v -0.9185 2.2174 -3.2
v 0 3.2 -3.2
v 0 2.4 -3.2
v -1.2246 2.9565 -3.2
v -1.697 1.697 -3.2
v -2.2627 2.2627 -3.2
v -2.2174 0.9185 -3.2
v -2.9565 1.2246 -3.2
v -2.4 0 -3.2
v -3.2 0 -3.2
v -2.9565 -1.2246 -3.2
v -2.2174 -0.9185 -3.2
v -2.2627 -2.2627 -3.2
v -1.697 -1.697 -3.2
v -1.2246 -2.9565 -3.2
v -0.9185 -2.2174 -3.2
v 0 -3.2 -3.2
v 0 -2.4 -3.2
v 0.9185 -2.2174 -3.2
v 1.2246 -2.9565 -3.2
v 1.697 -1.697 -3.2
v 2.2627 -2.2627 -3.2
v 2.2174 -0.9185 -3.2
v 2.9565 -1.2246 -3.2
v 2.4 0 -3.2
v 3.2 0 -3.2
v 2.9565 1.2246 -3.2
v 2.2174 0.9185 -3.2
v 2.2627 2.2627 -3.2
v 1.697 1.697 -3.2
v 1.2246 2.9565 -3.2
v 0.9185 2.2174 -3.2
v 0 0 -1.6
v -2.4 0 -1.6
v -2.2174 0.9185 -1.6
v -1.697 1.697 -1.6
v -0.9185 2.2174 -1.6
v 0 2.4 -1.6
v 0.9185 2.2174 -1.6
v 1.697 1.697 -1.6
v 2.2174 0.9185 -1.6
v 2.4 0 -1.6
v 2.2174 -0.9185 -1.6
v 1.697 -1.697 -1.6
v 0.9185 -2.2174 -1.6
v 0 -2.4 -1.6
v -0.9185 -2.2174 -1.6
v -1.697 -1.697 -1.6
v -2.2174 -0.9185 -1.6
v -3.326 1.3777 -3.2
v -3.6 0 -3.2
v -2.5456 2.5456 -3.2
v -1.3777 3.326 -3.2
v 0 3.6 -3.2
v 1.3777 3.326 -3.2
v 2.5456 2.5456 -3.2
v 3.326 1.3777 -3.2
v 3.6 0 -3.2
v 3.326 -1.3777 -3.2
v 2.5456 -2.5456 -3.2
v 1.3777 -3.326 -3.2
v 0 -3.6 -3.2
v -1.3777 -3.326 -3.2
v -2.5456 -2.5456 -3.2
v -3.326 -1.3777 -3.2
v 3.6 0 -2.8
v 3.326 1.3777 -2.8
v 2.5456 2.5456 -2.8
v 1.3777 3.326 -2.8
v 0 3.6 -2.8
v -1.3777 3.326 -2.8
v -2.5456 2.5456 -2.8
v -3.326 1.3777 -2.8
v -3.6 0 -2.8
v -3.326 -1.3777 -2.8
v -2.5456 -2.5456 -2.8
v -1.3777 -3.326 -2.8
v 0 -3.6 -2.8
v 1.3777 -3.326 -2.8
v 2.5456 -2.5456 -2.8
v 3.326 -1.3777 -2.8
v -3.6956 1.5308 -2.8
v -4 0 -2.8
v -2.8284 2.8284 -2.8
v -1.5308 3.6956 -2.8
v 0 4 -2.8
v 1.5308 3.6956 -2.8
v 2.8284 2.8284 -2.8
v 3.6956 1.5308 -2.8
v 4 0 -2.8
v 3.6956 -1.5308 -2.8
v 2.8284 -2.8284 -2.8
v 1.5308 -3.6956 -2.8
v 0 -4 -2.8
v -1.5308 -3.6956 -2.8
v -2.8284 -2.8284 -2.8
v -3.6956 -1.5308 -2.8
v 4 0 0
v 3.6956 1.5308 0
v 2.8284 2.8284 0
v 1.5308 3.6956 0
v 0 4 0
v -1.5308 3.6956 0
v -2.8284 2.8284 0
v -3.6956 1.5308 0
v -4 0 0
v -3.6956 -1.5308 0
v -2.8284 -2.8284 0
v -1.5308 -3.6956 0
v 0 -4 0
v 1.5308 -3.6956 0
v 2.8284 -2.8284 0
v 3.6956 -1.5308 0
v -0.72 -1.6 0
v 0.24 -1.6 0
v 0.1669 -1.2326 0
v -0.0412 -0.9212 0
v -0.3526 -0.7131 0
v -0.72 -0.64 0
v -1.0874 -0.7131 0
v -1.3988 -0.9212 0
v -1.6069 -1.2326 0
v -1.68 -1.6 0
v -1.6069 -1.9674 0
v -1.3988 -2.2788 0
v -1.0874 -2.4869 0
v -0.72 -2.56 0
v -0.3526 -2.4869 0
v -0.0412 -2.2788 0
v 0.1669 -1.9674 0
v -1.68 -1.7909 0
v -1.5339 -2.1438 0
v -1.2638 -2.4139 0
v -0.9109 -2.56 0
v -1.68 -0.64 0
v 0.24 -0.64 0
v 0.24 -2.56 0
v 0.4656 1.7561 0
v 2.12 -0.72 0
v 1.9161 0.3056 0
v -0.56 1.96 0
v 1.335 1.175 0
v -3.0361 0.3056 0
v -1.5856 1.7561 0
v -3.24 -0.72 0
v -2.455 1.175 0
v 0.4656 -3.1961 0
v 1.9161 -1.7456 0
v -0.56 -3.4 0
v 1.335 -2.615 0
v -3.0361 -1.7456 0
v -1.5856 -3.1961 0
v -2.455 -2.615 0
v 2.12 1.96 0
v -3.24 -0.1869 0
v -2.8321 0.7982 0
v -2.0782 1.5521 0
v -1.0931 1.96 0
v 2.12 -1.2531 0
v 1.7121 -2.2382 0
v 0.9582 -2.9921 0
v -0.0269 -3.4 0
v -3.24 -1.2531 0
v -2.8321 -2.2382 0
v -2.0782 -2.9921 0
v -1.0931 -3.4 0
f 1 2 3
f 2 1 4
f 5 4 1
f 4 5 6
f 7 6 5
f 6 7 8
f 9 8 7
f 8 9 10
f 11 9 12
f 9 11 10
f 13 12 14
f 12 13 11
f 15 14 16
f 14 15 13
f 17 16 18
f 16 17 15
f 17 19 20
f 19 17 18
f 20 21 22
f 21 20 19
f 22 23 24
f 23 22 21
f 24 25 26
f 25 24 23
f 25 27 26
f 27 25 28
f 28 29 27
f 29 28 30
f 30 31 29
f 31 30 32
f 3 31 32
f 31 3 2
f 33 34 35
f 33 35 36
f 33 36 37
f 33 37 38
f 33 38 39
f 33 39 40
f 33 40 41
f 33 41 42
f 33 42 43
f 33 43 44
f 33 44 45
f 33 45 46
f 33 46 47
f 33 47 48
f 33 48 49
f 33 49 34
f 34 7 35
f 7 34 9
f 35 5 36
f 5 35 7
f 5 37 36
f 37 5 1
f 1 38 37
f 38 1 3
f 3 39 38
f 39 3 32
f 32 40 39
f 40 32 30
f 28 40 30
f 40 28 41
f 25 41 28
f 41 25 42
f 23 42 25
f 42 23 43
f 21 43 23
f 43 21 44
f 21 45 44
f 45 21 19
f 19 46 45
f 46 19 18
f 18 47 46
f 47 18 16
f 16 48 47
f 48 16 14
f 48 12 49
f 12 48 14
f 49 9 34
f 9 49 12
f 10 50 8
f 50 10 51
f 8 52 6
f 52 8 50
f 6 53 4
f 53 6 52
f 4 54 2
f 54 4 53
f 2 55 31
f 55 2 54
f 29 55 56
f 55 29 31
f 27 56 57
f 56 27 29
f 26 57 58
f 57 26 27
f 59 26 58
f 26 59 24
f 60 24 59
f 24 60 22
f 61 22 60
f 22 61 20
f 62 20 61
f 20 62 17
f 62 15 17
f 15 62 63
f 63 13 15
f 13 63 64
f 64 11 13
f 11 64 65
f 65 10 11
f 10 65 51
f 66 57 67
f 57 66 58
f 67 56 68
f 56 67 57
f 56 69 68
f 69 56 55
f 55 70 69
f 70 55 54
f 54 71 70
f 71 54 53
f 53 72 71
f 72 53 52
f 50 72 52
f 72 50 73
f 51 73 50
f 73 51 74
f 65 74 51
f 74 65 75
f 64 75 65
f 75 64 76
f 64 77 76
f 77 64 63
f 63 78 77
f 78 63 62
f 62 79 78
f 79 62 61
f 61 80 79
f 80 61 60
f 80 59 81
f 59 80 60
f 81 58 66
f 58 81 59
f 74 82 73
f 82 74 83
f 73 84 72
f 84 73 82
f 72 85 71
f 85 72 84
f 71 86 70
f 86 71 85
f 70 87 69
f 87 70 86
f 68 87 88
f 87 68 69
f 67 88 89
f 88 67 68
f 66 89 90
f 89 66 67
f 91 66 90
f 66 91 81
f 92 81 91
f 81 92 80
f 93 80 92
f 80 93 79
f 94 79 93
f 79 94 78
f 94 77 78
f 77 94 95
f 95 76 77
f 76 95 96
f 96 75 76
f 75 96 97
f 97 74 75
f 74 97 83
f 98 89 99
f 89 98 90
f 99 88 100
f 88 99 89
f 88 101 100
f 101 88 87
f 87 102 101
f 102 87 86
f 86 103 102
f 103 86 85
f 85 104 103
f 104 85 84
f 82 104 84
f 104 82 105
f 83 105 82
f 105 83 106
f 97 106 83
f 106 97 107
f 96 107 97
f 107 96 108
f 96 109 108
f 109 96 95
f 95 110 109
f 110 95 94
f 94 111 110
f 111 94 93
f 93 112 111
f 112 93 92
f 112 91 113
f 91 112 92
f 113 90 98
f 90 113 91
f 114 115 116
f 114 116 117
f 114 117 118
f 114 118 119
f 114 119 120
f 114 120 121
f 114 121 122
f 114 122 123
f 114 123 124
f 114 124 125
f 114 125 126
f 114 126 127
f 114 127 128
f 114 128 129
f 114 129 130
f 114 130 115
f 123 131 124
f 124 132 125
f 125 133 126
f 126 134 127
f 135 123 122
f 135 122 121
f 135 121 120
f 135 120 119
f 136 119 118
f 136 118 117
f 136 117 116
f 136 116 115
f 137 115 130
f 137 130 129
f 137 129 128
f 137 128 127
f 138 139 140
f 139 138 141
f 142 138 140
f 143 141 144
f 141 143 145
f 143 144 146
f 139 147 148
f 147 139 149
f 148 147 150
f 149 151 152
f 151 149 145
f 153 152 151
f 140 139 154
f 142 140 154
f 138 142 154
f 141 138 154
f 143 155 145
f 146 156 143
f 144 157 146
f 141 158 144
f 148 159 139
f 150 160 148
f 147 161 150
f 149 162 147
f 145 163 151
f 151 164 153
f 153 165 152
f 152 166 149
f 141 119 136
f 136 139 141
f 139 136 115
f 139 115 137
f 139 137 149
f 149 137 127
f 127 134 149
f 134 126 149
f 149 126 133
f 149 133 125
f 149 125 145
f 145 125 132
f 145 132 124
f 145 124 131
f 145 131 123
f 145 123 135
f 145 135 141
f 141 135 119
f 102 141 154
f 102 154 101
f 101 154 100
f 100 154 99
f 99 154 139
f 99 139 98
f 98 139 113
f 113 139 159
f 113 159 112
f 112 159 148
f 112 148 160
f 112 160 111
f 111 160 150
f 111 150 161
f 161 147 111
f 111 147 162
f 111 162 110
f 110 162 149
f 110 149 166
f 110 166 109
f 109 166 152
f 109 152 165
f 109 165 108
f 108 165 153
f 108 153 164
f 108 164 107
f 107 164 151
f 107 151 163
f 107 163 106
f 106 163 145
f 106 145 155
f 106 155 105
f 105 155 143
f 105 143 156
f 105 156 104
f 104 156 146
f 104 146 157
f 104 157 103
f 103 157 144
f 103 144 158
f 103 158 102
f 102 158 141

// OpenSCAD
use <../lib.scad>
use <98138p07.scad>
$fa=1; $fs=0.2;
function ldraw_lib__10238(realsolid=false) = [
// 0 =Tile  1 x  1 Round with Eye Pattern
// 0 Name: 10238.dat
// 0 Author: Rolf Osterthun [Rolf]
// 0 !LDRAW_ORG Part Alias UPDATE 2016-01
// 0 !LICENSE Licensed under CC BY 2.0 and CC BY 4.0 : see CAreadme.txt
// 
// 0 BFC CERTIFY CW
  [0,"BFC","CERTIFY"],
  [0,"BFC","CW"],
// 
// 0 !HISTORY 2016-12-31 [PTadmin] Official Update 2016-01
// 
// 
// 0 // Alias of 98138p07
// 
// 1 16 0 0 0 1 0 0 0 1 0 0 0 1 98138p07.dat
  [1,16,0,0,0,1,0,0,0,1,0,0,0,1, ldraw_lib__98138p07(realsolid)],
];
module ldraw_lib__10238(step=0, col=false, unit=2/5, alt=false, line=0.2, solid=!$preview)
    makepoly(ldraw_lib__10238(solid), step=step, col=col, unit=unit, alt=alt, line=line, solid=solid);
ldraw_lib__10238(line=0.2);
